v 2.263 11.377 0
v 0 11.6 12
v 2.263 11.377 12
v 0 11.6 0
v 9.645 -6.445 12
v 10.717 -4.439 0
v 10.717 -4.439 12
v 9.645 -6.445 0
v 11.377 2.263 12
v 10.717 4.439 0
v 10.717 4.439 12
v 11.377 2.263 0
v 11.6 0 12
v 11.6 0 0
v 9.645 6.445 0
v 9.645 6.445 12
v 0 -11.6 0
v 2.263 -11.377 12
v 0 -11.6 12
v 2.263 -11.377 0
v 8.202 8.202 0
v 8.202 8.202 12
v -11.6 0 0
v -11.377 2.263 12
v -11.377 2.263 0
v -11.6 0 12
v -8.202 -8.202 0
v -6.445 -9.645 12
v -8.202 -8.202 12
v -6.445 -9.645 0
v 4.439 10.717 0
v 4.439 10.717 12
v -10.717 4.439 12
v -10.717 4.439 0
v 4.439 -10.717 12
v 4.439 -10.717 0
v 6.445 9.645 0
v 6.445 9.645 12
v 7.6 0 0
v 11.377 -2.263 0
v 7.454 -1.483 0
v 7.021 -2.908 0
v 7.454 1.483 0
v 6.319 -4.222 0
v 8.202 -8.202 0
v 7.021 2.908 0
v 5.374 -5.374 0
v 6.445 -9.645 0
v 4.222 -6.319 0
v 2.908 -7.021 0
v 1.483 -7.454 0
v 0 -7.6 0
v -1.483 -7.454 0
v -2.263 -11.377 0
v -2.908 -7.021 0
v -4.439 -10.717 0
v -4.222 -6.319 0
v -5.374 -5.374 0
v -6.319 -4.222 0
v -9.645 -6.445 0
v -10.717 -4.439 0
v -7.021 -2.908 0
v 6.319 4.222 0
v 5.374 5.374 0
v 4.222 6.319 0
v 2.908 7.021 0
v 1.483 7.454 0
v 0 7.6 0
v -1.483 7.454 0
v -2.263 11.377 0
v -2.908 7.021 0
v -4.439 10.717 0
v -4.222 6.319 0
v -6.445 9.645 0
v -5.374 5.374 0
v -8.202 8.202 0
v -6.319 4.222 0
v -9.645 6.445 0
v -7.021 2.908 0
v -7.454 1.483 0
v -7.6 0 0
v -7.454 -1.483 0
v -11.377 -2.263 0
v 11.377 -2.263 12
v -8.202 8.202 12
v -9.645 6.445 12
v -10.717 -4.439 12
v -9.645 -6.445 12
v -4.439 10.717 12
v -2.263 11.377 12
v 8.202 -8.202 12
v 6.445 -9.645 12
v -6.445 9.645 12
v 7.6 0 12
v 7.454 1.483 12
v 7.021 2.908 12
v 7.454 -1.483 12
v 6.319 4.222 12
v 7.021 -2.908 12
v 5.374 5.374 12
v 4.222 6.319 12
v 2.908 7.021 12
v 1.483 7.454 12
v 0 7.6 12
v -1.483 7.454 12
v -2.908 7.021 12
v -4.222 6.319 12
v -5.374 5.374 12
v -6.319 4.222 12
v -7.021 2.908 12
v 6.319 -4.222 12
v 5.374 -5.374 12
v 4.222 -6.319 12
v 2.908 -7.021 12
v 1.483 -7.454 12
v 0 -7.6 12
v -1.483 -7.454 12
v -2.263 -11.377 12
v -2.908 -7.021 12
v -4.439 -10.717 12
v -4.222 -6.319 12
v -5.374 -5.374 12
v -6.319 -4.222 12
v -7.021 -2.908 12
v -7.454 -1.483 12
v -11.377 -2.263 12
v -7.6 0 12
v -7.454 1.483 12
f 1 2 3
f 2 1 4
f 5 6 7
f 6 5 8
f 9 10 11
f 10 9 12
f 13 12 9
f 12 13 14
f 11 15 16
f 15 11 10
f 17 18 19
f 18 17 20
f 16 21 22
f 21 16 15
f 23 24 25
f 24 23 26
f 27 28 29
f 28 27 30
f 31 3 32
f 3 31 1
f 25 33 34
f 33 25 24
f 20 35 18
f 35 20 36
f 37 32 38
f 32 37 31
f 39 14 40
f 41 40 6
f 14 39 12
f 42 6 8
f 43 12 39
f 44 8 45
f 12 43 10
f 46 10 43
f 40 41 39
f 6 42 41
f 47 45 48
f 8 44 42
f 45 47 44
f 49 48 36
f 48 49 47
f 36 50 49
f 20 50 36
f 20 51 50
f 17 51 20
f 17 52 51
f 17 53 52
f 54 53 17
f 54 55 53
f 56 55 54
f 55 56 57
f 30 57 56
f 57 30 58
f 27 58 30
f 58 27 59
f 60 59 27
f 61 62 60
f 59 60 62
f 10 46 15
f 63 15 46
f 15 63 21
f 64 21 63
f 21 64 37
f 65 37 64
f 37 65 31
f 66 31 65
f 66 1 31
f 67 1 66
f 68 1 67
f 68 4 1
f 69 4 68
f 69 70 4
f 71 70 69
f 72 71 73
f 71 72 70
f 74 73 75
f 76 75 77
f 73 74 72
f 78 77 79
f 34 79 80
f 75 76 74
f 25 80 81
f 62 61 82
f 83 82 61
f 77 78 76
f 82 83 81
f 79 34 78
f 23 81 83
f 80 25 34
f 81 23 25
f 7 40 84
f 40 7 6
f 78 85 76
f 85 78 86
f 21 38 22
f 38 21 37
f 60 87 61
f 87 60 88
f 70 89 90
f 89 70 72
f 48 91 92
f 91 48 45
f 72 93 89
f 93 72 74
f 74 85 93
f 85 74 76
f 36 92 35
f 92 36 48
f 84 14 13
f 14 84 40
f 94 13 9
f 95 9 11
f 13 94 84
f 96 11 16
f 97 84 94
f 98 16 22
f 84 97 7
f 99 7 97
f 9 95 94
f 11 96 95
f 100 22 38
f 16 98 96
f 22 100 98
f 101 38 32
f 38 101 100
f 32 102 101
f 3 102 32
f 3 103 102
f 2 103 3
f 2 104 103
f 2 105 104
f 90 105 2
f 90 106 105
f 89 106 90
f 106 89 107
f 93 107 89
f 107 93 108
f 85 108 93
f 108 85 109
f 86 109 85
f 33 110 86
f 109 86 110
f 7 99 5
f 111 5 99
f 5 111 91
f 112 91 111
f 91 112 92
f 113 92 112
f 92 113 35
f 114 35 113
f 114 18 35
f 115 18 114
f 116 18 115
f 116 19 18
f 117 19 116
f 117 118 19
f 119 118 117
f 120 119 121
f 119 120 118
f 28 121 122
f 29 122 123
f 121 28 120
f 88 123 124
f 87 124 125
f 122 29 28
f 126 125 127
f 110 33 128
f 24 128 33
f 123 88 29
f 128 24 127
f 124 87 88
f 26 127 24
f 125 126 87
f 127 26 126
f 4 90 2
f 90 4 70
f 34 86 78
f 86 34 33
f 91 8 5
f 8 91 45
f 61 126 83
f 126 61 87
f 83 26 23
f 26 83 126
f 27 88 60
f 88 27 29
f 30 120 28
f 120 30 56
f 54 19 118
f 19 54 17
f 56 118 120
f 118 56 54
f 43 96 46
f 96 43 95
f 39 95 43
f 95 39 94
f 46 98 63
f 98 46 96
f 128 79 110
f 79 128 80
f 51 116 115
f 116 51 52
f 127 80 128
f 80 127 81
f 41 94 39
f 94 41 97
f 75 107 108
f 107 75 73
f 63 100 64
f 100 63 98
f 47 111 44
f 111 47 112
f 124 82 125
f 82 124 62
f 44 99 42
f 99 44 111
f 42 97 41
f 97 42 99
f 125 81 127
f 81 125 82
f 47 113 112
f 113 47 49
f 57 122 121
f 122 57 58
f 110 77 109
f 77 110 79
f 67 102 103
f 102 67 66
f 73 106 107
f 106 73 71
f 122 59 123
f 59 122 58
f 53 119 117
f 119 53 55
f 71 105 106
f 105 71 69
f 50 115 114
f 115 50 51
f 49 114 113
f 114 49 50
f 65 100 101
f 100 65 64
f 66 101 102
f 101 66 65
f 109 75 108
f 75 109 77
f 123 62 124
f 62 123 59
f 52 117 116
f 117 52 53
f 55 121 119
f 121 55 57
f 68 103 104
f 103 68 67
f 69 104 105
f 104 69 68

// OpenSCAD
$fn = 32;

// ----------------------------------------------------------------------
// Spacer sleeve: 23.2 / 15.2 x 12 mm
// ----------------------------------------------------------------------

// --- parameters (mm) ---
outer_d = 23.2;           // outside diameter
inner_d = 15.2;           // shaft bore
length = 12;              // sleeve length

module sleeve() {
  cylinder(h = length, d = outer_d);
}

difference() {
  sleeve();
  translate([0, 0, -1]) cylinder(h = length + 2, d = inner_d);
}
